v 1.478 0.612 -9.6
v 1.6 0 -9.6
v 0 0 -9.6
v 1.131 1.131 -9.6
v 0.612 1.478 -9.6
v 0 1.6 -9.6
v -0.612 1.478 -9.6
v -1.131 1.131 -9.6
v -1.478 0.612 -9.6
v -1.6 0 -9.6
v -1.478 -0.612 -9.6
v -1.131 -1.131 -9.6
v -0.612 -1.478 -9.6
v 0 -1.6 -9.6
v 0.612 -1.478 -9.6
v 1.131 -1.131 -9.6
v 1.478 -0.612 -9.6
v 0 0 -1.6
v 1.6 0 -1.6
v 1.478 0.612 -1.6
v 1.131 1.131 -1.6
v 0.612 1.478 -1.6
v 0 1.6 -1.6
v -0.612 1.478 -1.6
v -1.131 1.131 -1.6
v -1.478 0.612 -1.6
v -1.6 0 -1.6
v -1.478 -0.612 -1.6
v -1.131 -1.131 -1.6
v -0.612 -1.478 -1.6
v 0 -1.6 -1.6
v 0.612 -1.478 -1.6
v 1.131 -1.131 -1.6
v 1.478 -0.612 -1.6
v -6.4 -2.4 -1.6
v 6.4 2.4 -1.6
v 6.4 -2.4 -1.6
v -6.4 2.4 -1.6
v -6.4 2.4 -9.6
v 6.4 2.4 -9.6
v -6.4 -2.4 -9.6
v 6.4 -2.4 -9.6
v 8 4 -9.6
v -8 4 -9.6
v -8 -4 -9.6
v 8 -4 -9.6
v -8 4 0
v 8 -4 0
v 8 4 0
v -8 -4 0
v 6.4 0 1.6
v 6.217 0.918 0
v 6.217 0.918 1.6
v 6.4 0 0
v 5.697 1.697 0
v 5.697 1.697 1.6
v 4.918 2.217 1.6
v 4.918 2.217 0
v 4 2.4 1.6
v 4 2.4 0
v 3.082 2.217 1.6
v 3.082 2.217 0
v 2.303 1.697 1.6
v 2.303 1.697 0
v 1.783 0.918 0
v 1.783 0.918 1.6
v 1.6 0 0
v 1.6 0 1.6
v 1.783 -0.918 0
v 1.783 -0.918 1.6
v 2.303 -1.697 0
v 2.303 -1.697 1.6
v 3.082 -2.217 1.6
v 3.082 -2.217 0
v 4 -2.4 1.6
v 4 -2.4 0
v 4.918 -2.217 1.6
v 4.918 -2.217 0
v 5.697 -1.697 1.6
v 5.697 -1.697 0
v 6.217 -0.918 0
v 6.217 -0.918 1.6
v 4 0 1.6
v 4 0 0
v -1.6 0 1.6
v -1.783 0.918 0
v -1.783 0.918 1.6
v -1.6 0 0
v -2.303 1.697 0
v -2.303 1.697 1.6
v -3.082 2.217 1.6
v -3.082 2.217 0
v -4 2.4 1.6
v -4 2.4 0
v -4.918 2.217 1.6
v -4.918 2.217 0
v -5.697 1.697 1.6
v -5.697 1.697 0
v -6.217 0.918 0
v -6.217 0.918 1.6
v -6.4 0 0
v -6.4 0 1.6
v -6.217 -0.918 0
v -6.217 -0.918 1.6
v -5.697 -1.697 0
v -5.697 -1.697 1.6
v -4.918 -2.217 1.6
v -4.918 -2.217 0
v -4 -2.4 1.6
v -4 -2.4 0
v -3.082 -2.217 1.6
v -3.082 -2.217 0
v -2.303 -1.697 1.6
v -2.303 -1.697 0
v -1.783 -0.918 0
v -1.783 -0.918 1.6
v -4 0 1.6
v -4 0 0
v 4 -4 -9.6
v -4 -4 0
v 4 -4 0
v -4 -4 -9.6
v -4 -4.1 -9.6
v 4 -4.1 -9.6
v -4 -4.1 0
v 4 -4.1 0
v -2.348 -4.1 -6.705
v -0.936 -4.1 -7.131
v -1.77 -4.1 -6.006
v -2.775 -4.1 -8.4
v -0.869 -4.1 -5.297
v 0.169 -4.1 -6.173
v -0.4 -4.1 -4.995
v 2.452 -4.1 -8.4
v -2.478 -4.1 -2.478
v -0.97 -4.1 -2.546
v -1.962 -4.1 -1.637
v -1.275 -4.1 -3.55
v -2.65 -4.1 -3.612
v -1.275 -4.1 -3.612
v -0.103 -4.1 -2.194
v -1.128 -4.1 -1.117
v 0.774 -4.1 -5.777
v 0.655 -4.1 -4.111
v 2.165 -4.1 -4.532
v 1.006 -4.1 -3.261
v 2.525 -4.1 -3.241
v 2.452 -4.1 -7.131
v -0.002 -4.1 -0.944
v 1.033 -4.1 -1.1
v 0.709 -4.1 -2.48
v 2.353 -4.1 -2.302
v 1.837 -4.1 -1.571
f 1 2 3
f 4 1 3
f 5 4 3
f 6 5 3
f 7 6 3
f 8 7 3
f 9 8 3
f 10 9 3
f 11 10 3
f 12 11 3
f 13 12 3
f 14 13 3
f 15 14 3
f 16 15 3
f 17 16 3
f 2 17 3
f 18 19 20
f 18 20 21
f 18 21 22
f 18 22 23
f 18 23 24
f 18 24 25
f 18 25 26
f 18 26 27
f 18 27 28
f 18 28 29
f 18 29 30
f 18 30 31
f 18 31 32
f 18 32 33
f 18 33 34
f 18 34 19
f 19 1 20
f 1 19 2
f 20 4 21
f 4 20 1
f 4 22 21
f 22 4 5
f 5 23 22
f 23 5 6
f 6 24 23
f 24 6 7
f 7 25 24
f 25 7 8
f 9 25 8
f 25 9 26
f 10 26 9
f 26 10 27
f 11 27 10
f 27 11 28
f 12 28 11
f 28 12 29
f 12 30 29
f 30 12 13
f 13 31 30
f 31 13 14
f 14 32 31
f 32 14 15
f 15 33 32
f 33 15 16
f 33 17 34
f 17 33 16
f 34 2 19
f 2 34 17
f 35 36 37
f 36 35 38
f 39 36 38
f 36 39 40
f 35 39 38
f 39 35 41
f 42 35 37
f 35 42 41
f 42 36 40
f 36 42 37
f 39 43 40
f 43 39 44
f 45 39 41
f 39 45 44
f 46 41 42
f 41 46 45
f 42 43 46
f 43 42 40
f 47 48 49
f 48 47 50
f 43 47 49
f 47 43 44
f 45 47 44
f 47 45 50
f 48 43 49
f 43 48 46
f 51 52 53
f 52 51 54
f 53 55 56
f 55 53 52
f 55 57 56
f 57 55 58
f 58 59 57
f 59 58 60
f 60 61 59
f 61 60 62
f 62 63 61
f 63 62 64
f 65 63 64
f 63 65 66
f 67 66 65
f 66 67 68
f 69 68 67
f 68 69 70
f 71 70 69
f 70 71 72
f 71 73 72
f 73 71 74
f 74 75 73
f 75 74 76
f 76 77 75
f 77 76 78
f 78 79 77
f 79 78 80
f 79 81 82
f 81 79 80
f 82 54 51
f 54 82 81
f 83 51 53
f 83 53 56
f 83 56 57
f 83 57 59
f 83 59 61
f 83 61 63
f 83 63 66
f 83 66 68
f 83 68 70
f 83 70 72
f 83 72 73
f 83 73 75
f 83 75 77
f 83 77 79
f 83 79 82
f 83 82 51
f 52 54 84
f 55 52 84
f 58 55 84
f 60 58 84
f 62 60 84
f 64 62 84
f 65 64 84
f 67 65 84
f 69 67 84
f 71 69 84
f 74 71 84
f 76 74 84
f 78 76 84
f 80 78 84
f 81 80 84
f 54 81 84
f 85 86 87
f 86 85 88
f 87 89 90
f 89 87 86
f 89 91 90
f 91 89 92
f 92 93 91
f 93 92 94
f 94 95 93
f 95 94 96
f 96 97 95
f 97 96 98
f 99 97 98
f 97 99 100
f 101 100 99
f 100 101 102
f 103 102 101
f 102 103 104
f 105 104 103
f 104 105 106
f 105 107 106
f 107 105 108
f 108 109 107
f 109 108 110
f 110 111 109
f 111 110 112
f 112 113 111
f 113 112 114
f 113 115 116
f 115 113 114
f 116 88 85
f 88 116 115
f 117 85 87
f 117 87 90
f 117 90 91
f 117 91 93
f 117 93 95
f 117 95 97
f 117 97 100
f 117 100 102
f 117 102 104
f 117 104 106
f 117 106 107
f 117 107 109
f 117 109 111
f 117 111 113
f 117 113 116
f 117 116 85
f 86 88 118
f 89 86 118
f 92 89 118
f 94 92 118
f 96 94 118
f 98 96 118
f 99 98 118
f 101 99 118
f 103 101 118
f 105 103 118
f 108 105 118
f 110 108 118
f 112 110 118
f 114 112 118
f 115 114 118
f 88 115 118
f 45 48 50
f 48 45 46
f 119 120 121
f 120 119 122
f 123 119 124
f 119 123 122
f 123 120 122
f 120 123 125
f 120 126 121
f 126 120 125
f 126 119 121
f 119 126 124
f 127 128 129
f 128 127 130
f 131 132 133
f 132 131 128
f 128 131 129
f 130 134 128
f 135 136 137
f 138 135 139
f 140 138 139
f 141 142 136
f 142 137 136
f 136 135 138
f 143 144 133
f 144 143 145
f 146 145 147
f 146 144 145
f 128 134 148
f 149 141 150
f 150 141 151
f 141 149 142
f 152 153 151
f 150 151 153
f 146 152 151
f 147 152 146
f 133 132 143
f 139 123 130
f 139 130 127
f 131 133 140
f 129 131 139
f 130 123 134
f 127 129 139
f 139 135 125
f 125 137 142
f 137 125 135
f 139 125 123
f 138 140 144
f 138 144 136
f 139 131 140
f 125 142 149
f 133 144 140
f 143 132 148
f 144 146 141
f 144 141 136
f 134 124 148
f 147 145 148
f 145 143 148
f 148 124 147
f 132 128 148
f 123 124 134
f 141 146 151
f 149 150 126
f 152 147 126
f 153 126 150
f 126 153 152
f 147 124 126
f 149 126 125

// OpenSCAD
// file: ../p/4-4edge.scad
use <../lib.scad>
function ldraw_lib__4_4edge() = [
// 0 Circle 1.0
// 0 Name: 4-4edge.dat
// 0 Author: James Jessiman
// 0 !LDRAW_ORG Primitive UPDATE 2017-01
// 0 !LICENSE Licensed under CC BY 2.0 and CC BY 4.0 : see CAreadme.txt
// 
// 0 BFC CERTIFY CCW
  [0,"BFC","CERTIFY"],
  [0,"BFC","CCW"],
// 
// 0 !HISTORY 1998-12-15 [PTadmin] Official Update 1998-10
// 0 !HISTORY 2005-12-28 [PTadmin] Official Update 2005-01
// 0 !HISTORY 2007-06-24 [PTadmin] Header formatted for Contributor Agreement
// 0 !HISTORY 2008-07-01 [PTadmin] Official Update 2008-01
// 0 !HISTORY 2017-01-15 [Steffen] BFCed
// 0 !HISTORY 2017-12-30 [PTadmin] Official Update 2017-01
// 
// 
// 2 24 1 0 0 0.9239 0 0.3827
  [2,24,1,0,0,0.9239,0,0.3827],
// 2 24 0.9239 0 0.3827 0.7071 0 0.7071
  [2,24,0.9239,0,0.3827,0.7071,0,0.7071],
// 2 24 0.7071 0 0.7071 0.3827 0 0.9239
  [2,24,0.7071,0,0.7071,0.3827,0,0.9239],
// 2 24 0.3827 0 0.9239 0 0 1
  [2,24,0.3827,0,0.9239,0,0,1],
// 2 24 0 0 1 -0.3827 0 0.9239
  [2,24,0,0,1,-0.3827,0,0.9239],
// 2 24 -0.3827 0 0.9239 -0.7071 0 0.7071
  [2,24,-0.3827,0,0.9239,-0.7071,0,0.7071],
// 2 24 -0.7071 0 0.7071 -0.9239 0 0.3827
  [2,24,-0.7071,0,0.7071,-0.9239,0,0.3827],
// 2 24 -0.9239 0 0.3827 -1 0 -0
  [2,24,-0.9239,0,0.3827,-1,0,-0],
// 2 24 -1 0 -0 -0.9239 0 -0.3827
  [2,24,-1,0,-0,-0.9239,0,-0.3827],
// 2 24 -0.9239 0 -0.3827 -0.7071 0 -0.7071
  [2,24,-0.9239,0,-0.3827,-0.7071,0,-0.7071],
// 2 24 -0.7071 0 -0.7071 -0.3827 0 -0.9239
  [2,24,-0.7071,0,-0.7071,-0.3827,0,-0.9239],
// 2 24 -0.3827 0 -0.9239 0 0 -1
  [2,24,-0.3827,0,-0.9239,0,0,-1],
// 2 24 0 0 -1 0.3827 0 -0.9239
  [2,24,0,0,-1,0.3827,0,-0.9239],
// 2 24 0.3827 0 -0.9239 0.7071 0 -0.7071
  [2,24,0.3827,0,-0.9239,0.7071,0,-0.7071],
// 2 24 0.7071 0 -0.7071 0.9239 0 -0.3827
  [2,24,0.7071,0,-0.7071,0.9239,0,-0.3827],
// 2 24 0.9239 0 -0.3827 1 0 0
  [2,24,0.9239,0,-0.3827,1,0,0],
];
module ldraw_lib__4_4edge(step=0, col=false, unit=2/5, alt=false, line=0.2, solid=!$preview)
    makepoly(ldraw_lib__4_4edge(), step=step, col=col, unit=unit, alt=alt, line=line, solid=solid);
ldraw_lib__4_4edge(line=0.2);
// file: ../p/4-4disc.scad
use <../lib.scad>
function ldraw_lib__4_4disc() = [
// 0 Disc 1.0
// 0 Name: 4-4disc.dat
// 0 Author: James Jessiman
// 0 !LDRAW_ORG Primitive UPDATE 2002-02
// 0 !LICENSE Licensed under CC BY 2.0 and CC BY 4.0 : see CAreadme.txt
// 
// 0 BFC CERTIFY CCW
  [0,"BFC","CERTIFY"],
  [0,"BFC","CCW"],
// 
// 0 !HISTORY 1998-12-15 [PTadmin] Official Update 1998-10
// 0 !HISTORY 2002-03-23 [sbliss] Added BFC statement
// 0 !HISTORY 2002-04-25 [PTadmin] Official Update 2002-02
// 0 !HISTORY 2007-06-24 [PTadmin] Header formatted for Contributor Agreement
// 0 !HISTORY 2008-07-01 [PTadmin] Official Update 2008-01
// 
// 
// 3 16 0 0 0 1 0 0 0.9239 0 0.3827
  [3,16,0,0,0,1,0,0,0.9239,0,0.3827],
// 3 16 0 0 0 0.9239 0 0.3827 0.7071 0 0.7071
  [3,16,0,0,0,0.9239,0,0.3827,0.7071,0,0.7071],
// 3 16 0 0 0 0.7071 0 0.7071 0.3827 0 0.9239
  [3,16,0,0,0,0.7071,0,0.7071,0.3827,0,0.9239],
// 3 16 0 0 0 0.3827 0 0.9239 0 0 1
  [3,16,0,0,0,0.3827,0,0.9239,0,0,1],
// 3 16 0 0 0 0 0 1 -0.3827 0 0.9239
  [3,16,0,0,0,0,0,1,-0.3827,0,0.9239],
// 3 16 0 0 0 -0.3827 0 0.9239 -0.7071 0 0.7071
  [3,16,0,0,0,-0.3827,0,0.9239,-0.7071,0,0.7071],
// 3 16 0 0 0 -0.7071 0 0.7071 -0.9239 0 0.3827
  [3,16,0,0,0,-0.7071,0,0.7071,-0.9239,0,0.3827],
// 3 16 0 0 0 -0.9239 0 0.3827 -1 0 -0
  [3,16,0,0,0,-0.9239,0,0.3827,-1,0,-0],
// 3 16 0 0 0 -1 0 -0 -0.9239 0 -0.3827
  [3,16,0,0,0,-1,0,-0,-0.9239,0,-0.3827],
// 3 16 0 0 0 -0.9239 0 -0.3827 -0.7071 0 -0.7071
  [3,16,0,0,0,-0.9239,0,-0.3827,-0.7071,0,-0.7071],
// 3 16 0 0 0 -0.7071 0 -0.7071 -0.3827 0 -0.9239
  [3,16,0,0,0,-0.7071,0,-0.7071,-0.3827,0,-0.9239],
// 3 16 0 0 0 -0.3827 0 -0.9239 0 0 -1
  [3,16,0,0,0,-0.3827,0,-0.9239,0,0,-1],
// 3 16 0 0 0 0 0 -1 0.3827 0 -0.9239
  [3,16,0,0,0,0,0,-1,0.3827,0,-0.9239],
// 3 16 0 0 0 0.3827 0 -0.9239 0.7071 0 -0.7071
  [3,16,0,0,0,0.3827,0,-0.9239,0.7071,0,-0.7071],
// 3 16 0 0 0 0.7071 0 -0.7071 0.9239 0 -0.3827
  [3,16,0,0,0,0.7071,0,-0.7071,0.9239,0,-0.3827],
// 3 16 0 0 0 0.9239 0 -0.3827 1 0 0
  [3,16,0,0,0,0.9239,0,-0.3827,1,0,0],
// 0
];
module ldraw_lib__4_4disc(step=0, col=false, unit=2/5, alt=false, line=0.2, solid=!$preview)
    makepoly(ldraw_lib__4_4disc(), step=step, col=col, unit=unit, alt=alt, line=line, solid=solid);
ldraw_lib__4_4disc(line=0.2);
// file: ../p/4-4cyli.scad
use <../lib.scad>
$fa=1; $fs=0.2;
function ldraw_lib__4_4cyli(realsolid=false) = [
// 0 Cylinder 1.0
// 0 Name: 4-4cyli.dat
// 0 Author: James Jessiman
// 0 !LDRAW_ORG Primitive UPDATE 2005-01
// 0 !LICENSE Licensed under CC BY 2.0 and CC BY 4.0 : see CAreadme.txt
// 
// 0 BFC CERTIFY CCW
  [0,"BFC","CERTIFY"],
  [0,"BFC","CCW"],
// 
// 0 !HISTORY 1998-12-15 [PTadmin] Official Update 1998-10
// 0 !HISTORY 2002-03-23 [sbliss] Added BFC statement; merged headers from files in distributions LDraw 0.27 and Complete.
// 0 !HISTORY 2002-04-25 [PTadmin] Official Update 2002-02
// 0 !HISTORY 2004-12-14 [guyvivan] BFC CCW
// 0 !HISTORY 2005-12-28 [PTadmin] Official Update 2005-01
// 0 !HISTORY 2007-06-24 [PTadmin] Header formatted for Contributor Agreement
// 0 !HISTORY 2008-07-01 [PTadmin] Official Update 2008-01
// 
// 
// 4 16 1 1 0 0.9239 1 0.3827 0.9239 0 0.3827 1 0 0
  [4,16,1,1,0,0.9239,1,0.3827,0.9239,0,0.3827,1,0,0],
// 5 24 1 0 0 1 1 0 0.9239 0 0.3827 0.9239 0 -0.3827
  [5,24,1,0,0,1,1,0,0.9239,0,0.3827,0.9239,0,-0.3827],
// 4 16 0.9239 1 0.3827 0.7071 1 0.7071 0.7071 0 0.7071 0.9239 0 0.3827
  [4,16,0.9239,1,0.3827,0.7071,1,0.7071,0.7071,0,0.7071,0.9239,0,0.3827],
// 5 24 0.9239 0 0.3827 0.9239 1 0.3827 0.7071 0 0.7071 1 0 0
  [5,24,0.9239,0,0.3827,0.9239,1,0.3827,0.7071,0,0.7071,1,0,0],
// 4 16 0.7071 1 0.7071 0.3827 1 0.9239 0.3827 0 0.9239 0.7071 0 0.7071
  [4,16,0.7071,1,0.7071,0.3827,1,0.9239,0.3827,0,0.9239,0.7071,0,0.7071],
// 5 24 0.7071 0 0.7071 0.7071 1 0.7071 0.3827 0 0.9239 0.9239 0 0.3827
  [5,24,0.7071,0,0.7071,0.7071,1,0.7071,0.3827,0,0.9239,0.9239,0,0.3827],
// 4 16 0.3827 1 0.9239 0 1 1 0 0 1 0.3827 0 0.9239
  [4,16,0.3827,1,0.9239,0,1,1,0,0,1,0.3827,0,0.9239],
// 5 24 0.3827 0 0.9239 0.3827 1 0.9239 0 0 1 0.7071 0 0.7071
  [5,24,0.3827,0,0.9239,0.3827,1,0.9239,0,0,1,0.7071,0,0.7071],
// 4 16 0 1 1 -0.3827 1 0.9239 -0.3827 0 0.9239 0 0 1
  [4,16,0,1,1,-0.3827,1,0.9239,-0.3827,0,0.9239,0,0,1],
// 5 24 0 0 1 0 1 1 -0.3827 0 0.9239 0.3827 0 0.9239
  [5,24,0,0,1,0,1,1,-0.3827,0,0.9239,0.3827,0,0.9239],
// 4 16 -0.3827 1 0.9239 -0.7071 1 0.7071 -0.7071 0 0.7071 -0.3827 0 0.9239
  [4,16,-0.3827,1,0.9239,-0.7071,1,0.7071,-0.7071,0,0.7071,-0.3827,0,0.9239],
// 5 24 -0.3827 0 0.9239 -0.3827 1 0.9239 -0.7071 0 0.7071 0 0 1
  [5,24,-0.3827,0,0.9239,-0.3827,1,0.9239,-0.7071,0,0.7071,0,0,1],
// 4 16 -0.7071 1 0.7071 -0.9239 1 0.3827 -0.9239 0 0.3827 -0.7071 0 0.7071
  [4,16,-0.7071,1,0.7071,-0.9239,1,0.3827,-0.9239,0,0.3827,-0.7071,0,0.7071],
// 5 24 -0.7071 0 0.7071 -0.7071 1 0.7071 -0.9239 0 0.3827 -0.3827 0 0.9239
  [5,24,-0.7071,0,0.7071,-0.7071,1,0.7071,-0.9239,0,0.3827,-0.3827,0,0.9239],
// 4 16 -0.9239 1 0.3827 -1 1 0 -1 0 0 -0.9239 0 0.3827
  [4,16,-0.9239,1,0.3827,-1,1,0,-1,0,0,-0.9239,0,0.3827],
// 5 24 -0.9239 0 0.3827 -0.9239 1 0.3827 -1 0 0 -0.7071 0 0.7071
  [5,24,-0.9239,0,0.3827,-0.9239,1,0.3827,-1,0,0,-0.7071,0,0.7071],
// 4 16 -1 1 0 -0.9239 1 -0.3827 -0.9239 0 -0.3827 -1 0 0
  [4,16,-1,1,0,-0.9239,1,-0.3827,-0.9239,0,-0.3827,-1,0,0],
// 5 24 -1 0 0 -1 1 0 -0.9239 0 -0.3827 -0.9239 0 0.3827
  [5,24,-1,0,0,-1,1,0,-0.9239,0,-0.3827,-0.9239,0,0.3827],
// 4 16 -0.9239 1 -0.3827 -0.7071 1 -0.7071 -0.7071 0 -0.7071 -0.9239 0 -0.3827
  [4,16,-0.9239,1,-0.3827,-0.7071,1,-0.7071,-0.7071,0,-0.7071,-0.9239,0,-0.3827],
// 5 24 -0.9239 0 -0.3827 -0.9239 1 -0.3827 -0.7071 0 -0.7071 -1 0 0
  [5,24,-0.9239,0,-0.3827,-0.9239,1,-0.3827,-0.7071,0,-0.7071,-1,0,0],
// 4 16 -0.7071 1 -0.7071 -0.3827 1 -0.9239 -0.3827 0 -0.9239 -0.7071 0 -0.7071
  [4,16,-0.7071,1,-0.7071,-0.3827,1,-0.9239,-0.3827,0,-0.9239,-0.7071,0,-0.7071],
// 5 24 -0.7071 0 -0.7071 -0.7071 1 -0.7071 -0.3827 0 -0.9239 -0.9239 0 -0.3827
  [5,24,-0.7071,0,-0.7071,-0.7071,1,-0.7071,-0.3827,0,-0.9239,-0.9239,0,-0.3827],
// 4 16 -0.3827 1 -0.9239 0 1 -1 0 0 -1 -0.3827 0 -0.9239
  [4,16,-0.3827,1,-0.9239,0,1,-1,0,0,-1,-0.3827,0,-0.9239],
// 5 24 -0.3827 0 -0.9239 -0.3827 1 -0.9239 0 0 -1 -0.7071 0 -0.7071
  [5,24,-0.3827,0,-0.9239,-0.3827,1,-0.9239,0,0,-1,-0.7071,0,-0.7071],
// 4 16 0 1 -1 0.3827 1 -0.9239 0.3827 0 -0.9239 0 0 -1
  [4,16,0,1,-1,0.3827,1,-0.9239,0.3827,0,-0.9239,0,0,-1],
// 5 24 0 0 -1 0 1 -1 0.3827 0 -0.9239 -0.3827 0 -0.9239
  [5,24,0,0,-1,0,1,-1,0.3827,0,-0.9239,-0.3827,0,-0.9239],
// 4 16 0.3827 1 -0.9239 0.7071 1 -0.7071 0.7071 0 -0.7071 0.3827 0 -0.9239
  [4,16,0.3827,1,-0.9239,0.7071,1,-0.7071,0.7071,0,-0.7071,0.3827,0,-0.9239],
// 5 24 0.3827 0 -0.9239 0.3827 1 -0.9239 0.7071 0 -0.7071 0 0 -1
  [5,24,0.3827,0,-0.9239,0.3827,1,-0.9239,0.7071,0,-0.7071,0,0,-1],
// 4 16 0.7071 1 -0.7071 0.9239 1 -0.3827 0.9239 0 -0.3827 0.7071 0 -0.7071
  [4,16,0.7071,1,-0.7071,0.9239,1,-0.3827,0.9239,0,-0.3827,0.7071,0,-0.7071],
// 5 24 0.7071 0 -0.7071 0.7071 1 -0.7071 0.9239 0 -0.3827 0.3827 0 -0.9239
  [5,24,0.7071,0,-0.7071,0.7071,1,-0.7071,0.9239,0,-0.3827,0.3827,0,-0.9239],
// 4 16 0.9239 1 -0.3827 1 1 0 1 0 0 0.9239 0 -0.3827
  [4,16,0.9239,1,-0.3827,1,1,0,1,0,0,0.9239,0,-0.3827],
// 5 24 0.9239 0 -0.3827 0.9239 1 -0.3827 1 0 0 0.7071 0 -0.7071
  [5,24,0.9239,0,-0.3827,0.9239,1,-0.3827,1,0,0,0.7071,0,-0.7071],
// 0
];
module ldraw_lib__4_4cyli(step=0, col=false, unit=2/5, alt=false, line=0.2, solid=!$preview)
    makepoly(ldraw_lib__4_4cyli(solid), step=step, col=col, unit=unit, alt=alt, line=line, solid=solid);
ldraw_lib__4_4cyli(line=0.2);
// file: ../p/stud3.scad
use <../lib.scad>
use <4-4cyli.scad>
use <4-4disc.scad>
use <4-4edge.scad>
function ldraw_lib__stud3() = [
// 0 Stud Tube Solid
// 0 Name: stud3.dat
// 0 Author: James Jessiman
// 0 !LDRAW_ORG Primitive UPDATE 2012-01
// 0 !LICENSE Licensed under CC BY 4.0 : see CAreadme.txt
// 
// 0 BFC CERTIFY CCW
  [0,"BFC","CERTIFY"],
  [0,"BFC","CCW"],
// 
// 0 !HISTORY 2002-04-04 [sbliss] Modified for BFC compliance
// 0 !HISTORY 2002-04-25 [PTadmin] Official Update 2002-02
// 0 !HISTORY 2007-06-24 [PTadmin] Header formatted for Contributor Agreement
// 0 !HISTORY 2008-07-01 [PTadmin] Official Update 2008-01
// 0 !HISTORY 2012-02-16 [Philo] Changed to CCW
// 0 !HISTORY 2012-03-30 [PTadmin] Official Update 2012-01
// 
// 
// 1 16 0 -4 0 4 0 0 0 1 0 0 0 4 4-4edge.dat
  [1,16,0,-4,0,4,0,0,0,1,0,0,0,4, ldraw_lib__4_4edge()],
// 1 16 0 0 0 4 0 0 0 1 0 0 0 4 4-4edge.dat
  [1,16,0,0,0,4,0,0,0,1,0,0,0,4, ldraw_lib__4_4edge()],
// 1 16 0 -4 0 4 0 0 0 1 0 0 0 4 4-4disc.dat
  [1,16,0,-4,0,4,0,0,0,1,0,0,0,4, ldraw_lib__4_4disc()],
  [-1,16,0,0,0,4,0,0,0,-1,0,0,0,4, ldraw_lib__4_4disc()],
// 1 16 0 -4 0 4 0 0 0 4 0 0 0 4 4-4cyli.dat
  [1,16,0,-4,0,4,0,0,0,4,0,0,0,4, ldraw_lib__4_4cyli()],
];
module ldraw_lib__stud3(step=0, col=false, unit=2/5, alt=false, line=0.2, solid=!$preview)
    makepoly(ldraw_lib__stud3(), step=step, col=col, unit=unit, alt=alt, line=line, solid=solid);
ldraw_lib__stud3(line=0.2);
// file: ../p/stud.scad
use <../lib.scad>
use <4-4cyli.scad>
use <4-4disc.scad>
use <4-4edge.scad>
function ldraw_lib__stud() = [
// 0 Stud
// 0 Name: stud.dat
// 0 Author: James Jessiman
// 0 !LDRAW_ORG Primitive UPDATE 2012-01
// 0 !LICENSE Licensed under CC BY 4.0 : see CAreadme.txt
// 
// 0 BFC CERTIFY CCW
  [0,"BFC","CERTIFY"],
  [0,"BFC","CCW"],
// 
// 0 !HISTORY 2002-04-04 [sbliss] Modified for BFC compliance
// 0 !HISTORY 2002-04-25 [PTadmin] Official Update 2002-02
// 0 !HISTORY 2007-06-24 [PTadmin] Header formatted for Contributor Agreement
// 0 !HISTORY 2008-07-01 [PTadmin] Official Update 2008-01
// 0 !HISTORY 2012-02-16 [Philo] Changed to CCW
// 0 !HISTORY 2012-03-30 [PTadmin] Official Update 2012-01
// 
// 
// 1 16 0 0 0 6 0 0 0 1 0 0 0 6 4-4edge.dat
  [1,16,0,0,0,6,0,0,0,1,0,0,0,6, ldraw_lib__4_4edge()],
// 1 16 0 -4 0 6 0 0 0 1 0 0 0 6 4-4edge.dat
  [1,16,0,-4,0,6,0,0,0,1,0,0,0,6, ldraw_lib__4_4edge()],
// 1 16 0 0 0 6 0 0 0 -4 0 0 0 6 4-4cyli.dat
  [1,16,0,0,0,6,0,0,0,-4,0,0,0,6, ldraw_lib__4_4cyli()],
// 1 16 0 -4 0 6 0 0 0 1 0 0 0 6 4-4disc.dat
  [1,16,0,-4,0,6,0,0,0,1,0,0,0,6, ldraw_lib__4_4disc()],
  [-1,16,0,0,0,6,0,0,0,-1,0,0,0,6, ldraw_lib__4_4disc()],
];
module ldraw_lib__stud(step=0, col=false, unit=2/5, alt=false, line=0.2, solid=!$preview)
    makepoly(ldraw_lib__stud(), step=step, col=col, unit=unit, alt=alt, line=line, solid=solid);
ldraw_lib__stud(line=0.2);
// file: ../p/box5.scad
use <../lib.scad>
function ldraw_lib__box5() = [
// 0 Box with 5 Faces and All Edges
// 0 Name: box5.dat
// 0 Author: James Jessiman
// 0 !LDRAW_ORG Primitive UPDATE 2012-01
// 0 !LICENSE Licensed under CC BY 2.0 and CC BY 4.0 : see CAreadme.txt
// 
// 0 BFC CERTIFY CCW
  [0,"BFC","CERTIFY"],
  [0,"BFC","CCW"],
// 
// 0 !HISTORY 2002-04-03 [sbliss] Modified for BFC compliance
// 0 !HISTORY 2002-04-25 [PTadmin] Official Update 2002-02
// 0 !HISTORY 2007-06-24 [PTadmin] Header formatted for Contributor Agreement
// 0 !HISTORY 2008-07-01 [PTadmin] Official Update 2008-01
// 0 !HISTORY 2012-02-16 [Philo] Changed to CCW
// 0 !HISTORY 2012-03-30 [PTadmin] Official Update 2012-01
// 
// 
// 2 24 1 1 1 -1 1 1
  [2,24,1,1,1,-1,1,1],
// 2 24 -1 1 1 -1 1 -1
  [2,24,-1,1,1,-1,1,-1],
// 2 24 -1 1 -1 1 1 -1
  [2,24,-1,1,-1,1,1,-1],
// 2 24 1 1 -1 1 1 1
  [2,24,1,1,-1,1,1,1],
// 2 24 1 0 1 -1 0 1
  [2,24,1,0,1,-1,0,1],
// 2 24 -1 0 1 -1 0 -1
  [2,24,-1,0,1,-1,0,-1],
// 2 24 -1 0 -1 1 0 -1
  [2,24,-1,0,-1,1,0,-1],
// 2 24 1 0 -1 1 0 1
  [2,24,1,0,-1,1,0,1],
// 2 24 1 0 1 1 1 1
  [2,24,1,0,1,1,1,1],
// 2 24 -1 0 1 -1 1 1
  [2,24,-1,0,1,-1,1,1],
// 2 24 1 0 -1 1 1 -1
  [2,24,1,0,-1,1,1,-1],
// 2 24 -1 0 -1 -1 1 -1
  [2,24,-1,0,-1,-1,1,-1],
// 4 16 -1 1 1 1 1 1 1 1 -1 -1 1 -1
  [4,16,-1,1,1,1,1,1,1,1,-1,-1,1,-1],
// 4 16 -1 1 1 -1 0 1 1 0 1 1 1 1
  [4,16,-1,1,1,-1,0,1,1,0,1,1,1,1],
// 4 16 -1 1 -1 -1 0 -1 -1 0 1 -1 1 1
  [4,16,-1,1,-1,-1,0,-1,-1,0,1,-1,1,1],
// 4 16 1 1 -1 1 0 -1 -1 0 -1 -1 1 -1
  [4,16,1,1,-1,1,0,-1,-1,0,-1,-1,1,-1],
// 4 16 1 1 1 1 0 1 1 0 -1 1 1 -1
  [4,16,1,1,1,1,0,1,1,0,-1,1,1,-1],
];
makepoly(ldraw_lib__box5(), line=0.2);
// file: ../p/box4t.scad
use <../lib.scad>
function ldraw_lib__box4t() = [
// 0 Box with 4 Adjacent Faces and All Edges
// 0 Name: box4t.dat
// 0 Author: Tore Eriksson [Tore_Eriksson]
// 0 !LDRAW_ORG Primitive UPDATE 2003-02
// 0 !LICENSE Licensed under CC BY 2.0 and CC BY 4.0 : see CAreadme.txt
// 
// 0 BFC CERTIFY CCW
  [0,"BFC","CERTIFY"],
  [0,"BFC","CCW"],
// 
// 0 !HISTORY 1997-09-29 [PTadmin] Official Update 1997-15
// 0 !HISTORY 2002-08-31 [izanette] Modified with WINDZ for BFC compliance
// 0 !HISTORY 2003-08-01 [PTadmin] Official Update 2003-02
// 0 !HISTORY 2007-06-24 [PTadmin] Header formatted for Contributor Agreement
// 0 !HISTORY 2008-07-01 [PTadmin] Official Update 2008-01
// 
// 
// 2 24 1 1 1 -1 1 1
  [2,24,1,1,1,-1,1,1],
// 2 24 -1 1 1 -1 1 -1
  [2,24,-1,1,1,-1,1,-1],
// 2 24 -1 1 -1 1 1 -1
  [2,24,-1,1,-1,1,1,-1],
// 2 24 1 1 -1 1 1 1
  [2,24,1,1,-1,1,1,1],
// 2 24 1 0 1 -1 0 1
  [2,24,1,0,1,-1,0,1],
// 2 24 -1 0 1 -1 0 -1
  [2,24,-1,0,1,-1,0,-1],
// 2 24 -1 0 -1 1 0 -1
  [2,24,-1,0,-1,1,0,-1],
// 2 24 1 0 -1 1 0 1
  [2,24,1,0,-1,1,0,1],
// 2 24 1 0 1 1 1 1
  [2,24,1,0,1,1,1,1],
// 2 24 -1 0 1 -1 1 1
  [2,24,-1,0,1,-1,1,1],
// 2 24 1 0 -1 1 1 -1
  [2,24,1,0,-1,1,1,-1],
// 2 24 -1 0 -1 -1 1 -1
  [2,24,-1,0,-1,-1,1,-1],
// 4 16 1 1 1 1 1 -1 -1 1 -1 -1 1 1
  [4,16,1,1,1,1,1,-1,-1,1,-1,-1,1,1],
// 4 16 1 1 1 -1 1 1 -1 0 1 1 0 1
  [4,16,1,1,1,-1,1,1,-1,0,1,1,0,1],
// 4 16 -1 1 1 -1 1 -1 -1 0 -1 -1 0 1
  [4,16,-1,1,1,-1,1,-1,-1,0,-1,-1,0,1],
// 0 4 16 -1 1 -1 -1 0 -1 1 0 -1 1 1 -1
// 4 16 1 1 -1 1 1 1 1 0 1 1 0 -1
  [4,16,1,1,-1,1,1,1,1,0,1,1,0,-1],
// 0
];
makepoly(ldraw_lib__box4t(), line=0.2);
// file: ../p/box5-12.scad
use <../lib.scad>
function ldraw_lib__box5_12() = [
// 0 Box with 5 Faces without Any Edges
// 0 Name: box5-12.dat
// 0 Author: Chris Dee [cwdee]
// 0 !LDRAW_ORG Primitive UPDATE 2009-02
// 0 !LICENSE Licensed under CC BY 2.0 and CC BY 4.0 : see CAreadme.txt
// 
// 0 BFC CERTIFY CCW
  [0,"BFC","CERTIFY"],
  [0,"BFC","CCW"],
// 
// 0 !HISTORY 2009-09-03 [PTadmin] Official Update 2009-02
// 
// 
// 4 16 1 1 1 1 1 -1 -1 1 -1 -1 1 1
  [4,16,1,1,1,1,1,-1,-1,1,-1,-1,1,1],
// 4 16 -1 0 1 1 0 1 1 1 1 -1 1 1
  [4,16,-1,0,1,1,0,1,1,1,1,-1,1,1],
// 4 16 -1 0 -1 -1 0 1 -1 1 1 -1 1 -1
  [4,16,-1,0,-1,-1,0,1,-1,1,1,-1,1,-1],
// 4 16 1 0 -1 -1 0 -1 -1 1 -1 1 1 -1
  [4,16,1,0,-1,-1,0,-1,-1,1,-1,1,1,-1],
// 4 16 1 0 1 1 0 -1 1 1 -1 1 1 1
  [4,16,1,0,1,1,0,-1,1,1,-1,1,1,1],
// 0
];
module ldraw_lib__box5_12(step=0, col=false, unit=2/5, alt=false, line=0.2, solid=!$preview)
    makepoly(ldraw_lib__box5_12(), step=step, col=col, unit=unit, alt=alt, line=line, solid=solid);
ldraw_lib__box5_12(line=0.2);
// file: s/3004s01.scad
use <../../lib.scad>
use <../../p/box4t.scad>
use <../../p/box5.scad>
use <../../p/stud.scad>
use <../../p/stud3.scad>
$fa=1; $fs=0.2;
function ldraw_lib__s__3004s01(realsolid=false) = [
// 0 ~Brick  1 x  2 without Front Face
// 0 Name: s\3004s01.dat
// 0 Author: James Jessiman
// 0 !LDRAW_ORG Subpart UPDATE 2003-03
// 0 !LICENSE Licensed under CC BY 2.0 and CC BY 4.0 : see CAreadme.txt
// 
// 0 BFC CERTIFY CCW
  [0,"BFC","CERTIFY"],
  [0,"BFC","CCW"],
// 
// 0 !HISTORY 2003-09-07 [jriley] Subfiling, BFC
// 0 !HISTORY 2003-12-19 [PTadmin] Official Update 2003-03
// 0 !HISTORY 2007-08-29 [PTadmin] Header formatted for Contributor Agreement
// 0 !HISTORY 2008-07-01 [PTadmin] Official Update 2008-01
// 
// 
// 1 16 0 4 0 1 0 0 0 -5 0 0 0 1 stud3.dat
  [1,16,0,4,0,1,0,0,0,-5,0,0,0,1, ldraw_lib__stud3(realsolid)],
// 0 BFC INVERTNEXT
  [0,"BFC","INVERTNEXT"],
// 1 16 0 24 0 16 0 0 0 -20 0 0 0 6 box5.dat
  [1,16,0,24,0,16,0,0,0,-20,0,0,0,6, ldraw_lib__box5(realsolid)],
// 4 16 20 24 10 16 24 6 -16 24 6 -20 24 10
  [4,16,20,24,10,16,24,6,-16,24,6,-20,24,10],
// 4 16 -20 24 10 -16 24 6 -16 24 -6 -20 24 -10
  [4,16,-20,24,10,-16,24,6,-16,24,-6,-20,24,-10],
// 4 16 -20 24 -10 -16 24 -6 16 24 -6 20 24 -10
  [4,16,-20,24,-10,-16,24,-6,16,24,-6,20,24,-10],
// 4 16 20 24 -10 16 24 -6 16 24 6 20 24 10
  [4,16,20,24,-10,16,24,-6,16,24,6,20,24,10],
// 1 16 0 24 0 20 0 0 0 -24 0 0 0 10 box4t.dat
  [1,16,0,24,0,20,0,0,0,-24,0,0,0,10, ldraw_lib__box4t(realsolid)],
// 1 16 10 0 0 1 0 0 0 1 0 0 0 1 stud.dat
  [1,16,10,0,0,1,0,0,0,1,0,0,0,1, ldraw_lib__stud(realsolid)],
// 1 16 -10 0 0 1 0 0 0 1 0 0 0 1 stud.dat
  [1,16,-10,0,0,1,0,0,0,1,0,0,0,1, ldraw_lib__stud(realsolid)],
// 0
];
module ldraw_lib__s__3004s01(step=0, col=false, unit=2/5, alt=false, line=0.2, solid=!$preview)
    makepoly(ldraw_lib__s__3004s01(solid), step=step, col=col, unit=unit, alt=alt, line=line, solid=solid);
ldraw_lib__s__3004s01(line=0.2);
// file: 191888d.scad
use <../lib.scad>
use <../p/box5-12.scad>
$fa=1; $fs=0.2;
function ldraw_lib__191888d(realsolid=false) = [
// 0 Sticker  1.2 x  1 with White "2"
// 0 Name: 191888d.dat
// 0 Author: Steffen [Steffen]
// 0 !LDRAW_ORG Part UPDATE 2012-01
// 0 !LICENSE Licensed under CC BY 2.0 and CC BY 4.0 : see CAreadme.txt
// 
// 0 BFC CERTIFY CCW
  [0,"BFC","CERTIFY"],
  [0,"BFC","CCW"],
// 
// 0 !KEYWORDS set 7710
// 
// 0 !HISTORY 2012-03-30 [PTadmin] Official Update 2012-01
// 
// 
// 1 16 0 -0.25 0 10 0 0 0 0.25 0 0 0 -12 box5-12.dat
  [1,16,0,-0.25,0,10,0,0,0,0.25,0,0,0,-12, ldraw_lib__box5_12(realsolid)],
// 3 15 -5.87 -0.25 -4.763 -2.341 -0.25 -5.828 -4.425 -0.25 -3.014
  [3,15,-5.87,-0.25,-4.763,-2.341,-0.25,-5.828,-4.425,-0.25,-3.014],
// 3 15 -2.341 -0.25 -5.828 -5.87 -0.25 -4.763 -6.938 -0.25 -9
  [3,15,-2.341,-0.25,-5.828,-5.87,-0.25,-4.763,-6.938,-0.25,-9],
// 3 15 -2.172 -0.25 -1.242 0.422 -0.25 -3.432 -1 -0.25 -0.487
  [3,15,-2.172,-0.25,-1.242,0.422,-0.25,-3.432,-1,-0.25,-0.487],
// 3 15 0.422 -0.25 -3.432 -2.172 -0.25 -1.242 -2.341 -0.25 -5.828
  [3,15,0.422,-0.25,-3.432,-2.172,-0.25,-1.242,-2.341,-0.25,-5.828],
// 3 15 -2.341 -0.25 -5.828 -2.172 -0.25 -1.242 -4.425 -0.25 -3.014
  [3,15,-2.341,-0.25,-5.828,-2.172,-0.25,-1.242,-4.425,-0.25,-3.014],
// 3 15 -6.938 -0.25 -9 6.13 -0.25 -9 -2.341 -0.25 -5.828
  [3,15,-6.938,-0.25,-9,6.13,-0.25,-9,-2.341,-0.25,-5.828],
// 3 15 -6.195 -0.25 5.806 -2.426 -0.25 5.635 -4.905 -0.25 7.907
  [3,15,-6.195,-0.25,5.806,-2.426,-0.25,5.635,-4.905,-0.25,7.907],
// 3 15 -3.188 -0.25 3.125 -6.195 -0.25 5.806 -6.625 -0.25 2.969
  [3,15,-3.188,-0.25,3.125,-6.195,-0.25,5.806,-6.625,-0.25,2.969],
// 3 15 -3.188 -0.25 2.969 -3.188 -0.25 3.125 -6.625 -0.25 2.969
  [3,15,-3.188,-0.25,2.969,-3.188,-0.25,3.125,-6.625,-0.25,2.969],
// 3 15 -0.258 -0.25 6.516 -2.821 -0.25 9.207 -2.426 -0.25 5.635
  [3,15,-0.258,-0.25,6.516,-2.821,-0.25,9.207,-2.426,-0.25,5.635],
// 3 15 -2.821 -0.25 9.207 -4.905 -0.25 7.907 -2.426 -0.25 5.635
  [3,15,-2.821,-0.25,9.207,-4.905,-0.25,7.907,-2.426,-0.25,5.635],
// 3 15 -2.426 -0.25 5.635 -6.195 -0.25 5.806 -3.188 -0.25 3.125
  [3,15,-2.426,-0.25,5.635,-6.195,-0.25,5.806,-3.188,-0.25,3.125],
// 3 15 1.934 -0.25 -2.443 1.637 -0.25 1.722 -1 -0.25 -0.487
  [3,15,1.934,-0.25,-2.443,1.637,-0.25,1.722,-1,-0.25,-0.487],
// 3 15 1.637 -0.25 1.722 1.934 -0.25 -2.443 5.413 -0.25 0.669
  [3,15,1.637,-0.25,1.722,1.934,-0.25,-2.443,5.413,-0.25,0.669],
// 3 15 2.516 -0.25 3.847 5.413 -0.25 0.669 6.313 -0.25 3.898
  [3,15,2.516,-0.25,3.847,5.413,-0.25,0.669,6.313,-0.25,3.898],
// 3 15 2.516 -0.25 3.847 1.637 -0.25 1.722 5.413 -0.25 0.669
  [3,15,2.516,-0.25,3.847,1.637,-0.25,1.722,5.413,-0.25,0.669],
// 3 15 -2.341 -0.25 -5.828 6.13 -0.25 -9 6.13 -0.25 -5.828
  [3,15,-2.341,-0.25,-5.828,6.13,-0.25,-9,6.13,-0.25,-5.828],
// 3 15 -0.006 -0.25 9.641 -0.258 -0.25 6.516 2.583 -0.25 9.249
  [3,15,-0.006,-0.25,9.641,-0.258,-0.25,6.516,2.583,-0.25,9.249],
// 3 15 2.583 -0.25 9.249 -0.258 -0.25 6.516 1.773 -0.25 5.8
  [3,15,2.583,-0.25,9.249,-0.258,-0.25,6.516,1.773,-0.25,5.8],
// 3 15 -0.258 -0.25 6.516 -0.006 -0.25 9.641 -2.821 -0.25 9.207
  [3,15,-0.258,-0.25,6.516,-0.006,-0.25,9.641,-2.821,-0.25,9.207],
// 3 15 5.882 -0.25 6.244 4.593 -0.25 8.072 1.773 -0.25 5.8
  [3,15,5.882,-0.25,6.244,4.593,-0.25,8.072,1.773,-0.25,5.8],
// 3 15 2.583 -0.25 9.249 1.773 -0.25 5.8 4.593 -0.25 8.072
  [3,15,2.583,-0.25,9.249,1.773,-0.25,5.8,4.593,-0.25,8.072],
// 3 15 2.516 -0.25 3.847 5.882 -0.25 6.244 1.773 -0.25 5.8
  [3,15,2.516,-0.25,3.847,5.882,-0.25,6.244,1.773,-0.25,5.8],
// 3 15 6.313 -0.25 3.898 5.882 -0.25 6.244 2.516 -0.25 3.847
  [3,15,6.313,-0.25,3.898,5.882,-0.25,6.244,2.516,-0.25,3.847],
// 3 15 -1 -0.25 -0.487 0.422 -0.25 -3.432 1.934 -0.25 -2.443
  [3,15,-1,-0.25,-0.487,0.422,-0.25,-3.432,1.934,-0.25,-2.443],
// 3 16 -6.625 -0.25 2.969 -10 -0.25 -12 -6.938 -0.25 -9
  [3,16,-6.625,-0.25,2.969,-10,-0.25,-12,-6.938,-0.25,-9],
// 3 16 -6.625 -0.25 2.969 -6.938 -0.25 -9 -5.87 -0.25 -4.763
  [3,16,-6.625,-0.25,2.969,-6.938,-0.25,-9,-5.87,-0.25,-4.763],
// 3 16 -2.172 -0.25 -1.242 -1 -0.25 -0.487 -3.188 -0.25 2.969
  [3,16,-2.172,-0.25,-1.242,-1,-0.25,-0.487,-3.188,-0.25,2.969],
// 3 16 -4.425 -0.25 -3.014 -2.172 -0.25 -1.242 -6.625 -0.25 2.969
  [3,16,-4.425,-0.25,-3.014,-2.172,-0.25,-1.242,-6.625,-0.25,2.969],
// 3 16 -6.938 -0.25 -9 -10 -0.25 -12 6.13 -0.25 -9
  [3,16,-6.938,-0.25,-9,-10,-0.25,-12,6.13,-0.25,-9],
// 3 16 -5.87 -0.25 -4.763 -4.425 -0.25 -3.014 -6.625 -0.25 2.969
  [3,16,-5.87,-0.25,-4.763,-4.425,-0.25,-3.014,-6.625,-0.25,2.969],
// 3 16 -6.625 -0.25 2.969 -6.195 -0.25 5.806 -10 -0.25 12
  [3,16,-6.625,-0.25,2.969,-6.195,-0.25,5.806,-10,-0.25,12],
// 3 16 -10 -0.25 12 -4.905 -0.25 7.907 -2.821 -0.25 9.207
  [3,16,-10,-0.25,12,-4.905,-0.25,7.907,-2.821,-0.25,9.207],
// 3 16 -4.905 -0.25 7.907 -10 -0.25 12 -6.195 -0.25 5.806
  [3,16,-4.905,-0.25,7.907,-10,-0.25,12,-6.195,-0.25,5.806],
// 3 16 -6.625 -0.25 2.969 -10 -0.25 12 -10 -0.25 -12
  [3,16,-6.625,-0.25,2.969,-10,-0.25,12,-10,-0.25,-12],
// 3 16 -3.188 -0.25 3.125 -3.188 -0.25 2.969 1.637 -0.25 1.722
  [3,16,-3.188,-0.25,3.125,-3.188,-0.25,2.969,1.637,-0.25,1.722],
// 3 16 -3.188 -0.25 3.125 1.637 -0.25 1.722 -2.426 -0.25 5.635
  [3,16,-3.188,-0.25,3.125,1.637,-0.25,1.722,-2.426,-0.25,5.635],
// 3 16 -6.625 -0.25 2.969 -2.172 -0.25 -1.242 -3.188 -0.25 2.969
  [3,16,-6.625,-0.25,2.969,-2.172,-0.25,-1.242,-3.188,-0.25,2.969],
// 3 16 -10 -0.25 12 -2.821 -0.25 9.207 -0.006 -0.25 9.641
  [3,16,-10,-0.25,12,-2.821,-0.25,9.207,-0.006,-0.25,9.641],
// 3 16 -1 -0.25 -0.487 1.637 -0.25 1.722 -3.188 -0.25 2.969
  [3,16,-1,-0.25,-0.487,1.637,-0.25,1.722,-3.188,-0.25,2.969],
// 3 16 1.934 -0.25 -2.443 0.422 -0.25 -3.432 6.13 -0.25 -5.828
  [3,16,1.934,-0.25,-2.443,0.422,-0.25,-3.432,6.13,-0.25,-5.828],
// 3 16 1.637 -0.25 1.722 2.516 -0.25 3.847 -0.258 -0.25 6.516
  [3,16,1.637,-0.25,1.722,2.516,-0.25,3.847,-0.258,-0.25,6.516],
// 3 16 1.637 -0.25 1.722 -0.258 -0.25 6.516 -2.426 -0.25 5.635
  [3,16,1.637,-0.25,1.722,-0.258,-0.25,6.516,-2.426,-0.25,5.635],
// 3 16 6.13 -0.25 -9 10 -0.25 -12 6.13 -0.25 -5.828
  [3,16,6.13,-0.25,-9,10,-0.25,-12,6.13,-0.25,-5.828],
// 3 16 6.313 -0.25 3.898 5.413 -0.25 0.669 6.13 -0.25 -5.828
  [3,16,6.313,-0.25,3.898,5.413,-0.25,0.669,6.13,-0.25,-5.828],
// 3 16 5.413 -0.25 0.669 1.934 -0.25 -2.443 6.13 -0.25 -5.828
  [3,16,5.413,-0.25,0.669,1.934,-0.25,-2.443,6.13,-0.25,-5.828],
// 3 16 6.13 -0.25 -5.828 10 -0.25 -12 6.313 -0.25 3.898
  [3,16,6.13,-0.25,-5.828,10,-0.25,-12,6.313,-0.25,3.898],
// 3 16 0.422 -0.25 -3.432 -2.341 -0.25 -5.828 6.13 -0.25 -5.828
  [3,16,0.422,-0.25,-3.432,-2.341,-0.25,-5.828,6.13,-0.25,-5.828],
// 3 16 -10 -0.25 -12 10 -0.25 -12 6.13 -0.25 -9
  [3,16,-10,-0.25,-12,10,-0.25,-12,6.13,-0.25,-9],
// 3 16 -0.258 -0.25 6.516 2.516 -0.25 3.847 1.773 -0.25 5.8
  [3,16,-0.258,-0.25,6.516,2.516,-0.25,3.847,1.773,-0.25,5.8],
// 3 16 -0.006 -0.25 9.641 2.583 -0.25 9.249 10 -0.25 12
  [3,16,-0.006,-0.25,9.641,2.583,-0.25,9.249,10,-0.25,12],
// 3 16 5.882 -0.25 6.244 6.313 -0.25 3.898 10 -0.25 12
  [3,16,5.882,-0.25,6.244,6.313,-0.25,3.898,10,-0.25,12],
// 3 16 4.593 -0.25 8.072 10 -0.25 12 2.583 -0.25 9.249
  [3,16,4.593,-0.25,8.072,10,-0.25,12,2.583,-0.25,9.249],
// 3 16 10 -0.25 12 4.593 -0.25 8.072 5.882 -0.25 6.244
  [3,16,10,-0.25,12,4.593,-0.25,8.072,5.882,-0.25,6.244],
// 3 16 6.313 -0.25 3.898 10 -0.25 -12 10 -0.25 12
  [3,16,6.313,-0.25,3.898,10,-0.25,-12,10,-0.25,12],
// 3 16 -0.006 -0.25 9.641 10 -0.25 12 -10 -0.25 12
  [3,16,-0.006,-0.25,9.641,10,-0.25,12,-10,-0.25,12],
];
module ldraw_lib__191888d(step=0, col=false, unit=2/5, alt=false, line=0.2, solid=!$preview)
    makepoly(ldraw_lib__191888d(solid), step=step, col=col, unit=unit, alt=alt, line=line, solid=solid);
ldraw_lib__191888d(line=0.2);
// file: 3004.scad
use <../lib.scad>
use <s/3004s01.scad>
function ldraw_lib__3004() = [
// 0 Brick  1 x  2
// 0 Name: 3004.dat
// 0 Author: James Jessiman
// 0 !LDRAW_ORG Part UPDATE 2022-05
// 0 !LICENSE Licensed under CC BY 2.0 and CC BY 4.0 : see CAreadme.txt
// 
// 0 BFC CERTIFY CCW
  [0,"BFC","CERTIFY"],
  [0,"BFC","CCW"],
// 
// 0 !HISTORY 2001-10-26 [PTadmin] Official Update 2001-01
// 0 !HISTORY 2002-05-07 {unknown} BFC Certification
// 0 !HISTORY 2002-06-11 [PTadmin] Official Update 2002-03
// 0 !HISTORY 2007-05-07 [PTadmin] Header formatted for Contributor Agreement
// 0 !HISTORY 2008-07-01 [PTadmin] Official Update 2008-01
// 0 !HISTORY 2022-08-04 [MagFors] Using subfile
// 0 !HISTORY 2022-09-15 [PTadmin] Official Update 2022-05
// 
// 
// 1 16 0 0 0 1 0 0 0 1 0 0 0 1 s\3004s01.dat
  [1,16,0,0,0,1,0,0,0,1,0,0,0,1, ldraw_lib__s__3004s01()],
// 4 16 -20 24 -10 20 24 -10 20 0 -10 -20 0 -10
  [4,16,-20,24,-10,20,24,-10,20,0,-10,-20,0,-10],
];
module ldraw_lib__3004(step=0, col=false, unit=2/5, alt=false, line=0.2, solid=!$preview)
    makepoly(ldraw_lib__3004(), step=step, col=col, unit=unit, alt=alt, line=line, solid=solid);
ldraw_lib__3004(line=0.2);
// file: 196925d.scad
use <../lib.scad>
use <191888d.scad>
function ldraw_lib__196925d() = [
// 0 =Sticker  1.2 x  1 with White "2"
// 0 Name: 196925d.dat
// 0 Author: Takeshi Takahashi [RainbowDolphin]
// 0 !LDRAW_ORG Part Alias UPDATE 2025-03
// 0 !LICENSE Licensed under CC BY 4.0 : see CAreadme.txt
// 
// 0 BFC CERTIFY CCW
  [0,"BFC","CERTIFY"],
  [0,"BFC","CCW"],
// 
// 0 !KEYWORDS Bricklink 7715stk01, Brickowl 717614
// 0 !KEYWORDS Push-Along Passenger Steam Train, Rebrickable 196925, Set 7715
// 0 !KEYWORDS Trains
// 
// 0 !HISTORY 2025-03-30 [OrionP] Official Update 2025-03
// 
// 1 16 0 0 0 1 0 0 0 1 0 0 0 1 191888d.dat
  [1,16,0,0,0,1,0,0,0,1,0,0,0,1, ldraw_lib__191888d()],
];
module ldraw_lib__196925d(step=0, col=false, unit=2/5, alt=false, line=0.2, solid=!$preview)
    makepoly(ldraw_lib__196925d(), step=step, col=col, unit=unit, alt=alt, line=line, solid=solid);
ldraw_lib__196925d(line=0.2);
// main file
use <../lib.scad>
use <196925d.scad>
use <3004.scad>
function ldraw_lib__3004d0q() = [
// 0 Brick  1 x  2 with White "2" Sticker
// 0 Name: 3004d0q.dat
// 0 Author: Takeshi Takahashi [RainbowDolphin]
// 0 !LDRAW_ORG Shortcut UPDATE 2025-03
// 0 !LICENSE Licensed under CC BY 4.0 : see CAreadme.txt
// 
// 0 BFC CERTIFY CCW
  [0,"BFC","CERTIFY"],
  [0,"BFC","CCW"],
// 
// 0 !CATEGORY Sticker Shortcut
// 0 !KEYWORDS Bricklink 3004pb040, Set 7715, Train
// 
// 0 !HISTORY 2025-03-30 [OrionP] Official Update 2025-03
// 
// 1 16 0 0 0 1 0 0 0 1 0 0 0 1 3004.dat
  [1,16,0,0,0,1,0,0,0,1,0,0,0,1, ldraw_lib__3004()],
// 1 16 0 12 -10 1 0 0 0 0 -1 0 1 0 196925d.dat
  [1,16,0,12,-10,1,0,0,0,0,-1,0,1,0, ldraw_lib__196925d()],
];
module ldraw_lib__3004d0q(step=0, col=false, unit=2/5, alt=false, line=0.2, solid=!$preview)
    makepoly(ldraw_lib__3004d0q(), step=step, col=col, unit=unit, alt=alt, line=line, solid=solid);
ldraw_lib__3004d0q(line=0.2);
